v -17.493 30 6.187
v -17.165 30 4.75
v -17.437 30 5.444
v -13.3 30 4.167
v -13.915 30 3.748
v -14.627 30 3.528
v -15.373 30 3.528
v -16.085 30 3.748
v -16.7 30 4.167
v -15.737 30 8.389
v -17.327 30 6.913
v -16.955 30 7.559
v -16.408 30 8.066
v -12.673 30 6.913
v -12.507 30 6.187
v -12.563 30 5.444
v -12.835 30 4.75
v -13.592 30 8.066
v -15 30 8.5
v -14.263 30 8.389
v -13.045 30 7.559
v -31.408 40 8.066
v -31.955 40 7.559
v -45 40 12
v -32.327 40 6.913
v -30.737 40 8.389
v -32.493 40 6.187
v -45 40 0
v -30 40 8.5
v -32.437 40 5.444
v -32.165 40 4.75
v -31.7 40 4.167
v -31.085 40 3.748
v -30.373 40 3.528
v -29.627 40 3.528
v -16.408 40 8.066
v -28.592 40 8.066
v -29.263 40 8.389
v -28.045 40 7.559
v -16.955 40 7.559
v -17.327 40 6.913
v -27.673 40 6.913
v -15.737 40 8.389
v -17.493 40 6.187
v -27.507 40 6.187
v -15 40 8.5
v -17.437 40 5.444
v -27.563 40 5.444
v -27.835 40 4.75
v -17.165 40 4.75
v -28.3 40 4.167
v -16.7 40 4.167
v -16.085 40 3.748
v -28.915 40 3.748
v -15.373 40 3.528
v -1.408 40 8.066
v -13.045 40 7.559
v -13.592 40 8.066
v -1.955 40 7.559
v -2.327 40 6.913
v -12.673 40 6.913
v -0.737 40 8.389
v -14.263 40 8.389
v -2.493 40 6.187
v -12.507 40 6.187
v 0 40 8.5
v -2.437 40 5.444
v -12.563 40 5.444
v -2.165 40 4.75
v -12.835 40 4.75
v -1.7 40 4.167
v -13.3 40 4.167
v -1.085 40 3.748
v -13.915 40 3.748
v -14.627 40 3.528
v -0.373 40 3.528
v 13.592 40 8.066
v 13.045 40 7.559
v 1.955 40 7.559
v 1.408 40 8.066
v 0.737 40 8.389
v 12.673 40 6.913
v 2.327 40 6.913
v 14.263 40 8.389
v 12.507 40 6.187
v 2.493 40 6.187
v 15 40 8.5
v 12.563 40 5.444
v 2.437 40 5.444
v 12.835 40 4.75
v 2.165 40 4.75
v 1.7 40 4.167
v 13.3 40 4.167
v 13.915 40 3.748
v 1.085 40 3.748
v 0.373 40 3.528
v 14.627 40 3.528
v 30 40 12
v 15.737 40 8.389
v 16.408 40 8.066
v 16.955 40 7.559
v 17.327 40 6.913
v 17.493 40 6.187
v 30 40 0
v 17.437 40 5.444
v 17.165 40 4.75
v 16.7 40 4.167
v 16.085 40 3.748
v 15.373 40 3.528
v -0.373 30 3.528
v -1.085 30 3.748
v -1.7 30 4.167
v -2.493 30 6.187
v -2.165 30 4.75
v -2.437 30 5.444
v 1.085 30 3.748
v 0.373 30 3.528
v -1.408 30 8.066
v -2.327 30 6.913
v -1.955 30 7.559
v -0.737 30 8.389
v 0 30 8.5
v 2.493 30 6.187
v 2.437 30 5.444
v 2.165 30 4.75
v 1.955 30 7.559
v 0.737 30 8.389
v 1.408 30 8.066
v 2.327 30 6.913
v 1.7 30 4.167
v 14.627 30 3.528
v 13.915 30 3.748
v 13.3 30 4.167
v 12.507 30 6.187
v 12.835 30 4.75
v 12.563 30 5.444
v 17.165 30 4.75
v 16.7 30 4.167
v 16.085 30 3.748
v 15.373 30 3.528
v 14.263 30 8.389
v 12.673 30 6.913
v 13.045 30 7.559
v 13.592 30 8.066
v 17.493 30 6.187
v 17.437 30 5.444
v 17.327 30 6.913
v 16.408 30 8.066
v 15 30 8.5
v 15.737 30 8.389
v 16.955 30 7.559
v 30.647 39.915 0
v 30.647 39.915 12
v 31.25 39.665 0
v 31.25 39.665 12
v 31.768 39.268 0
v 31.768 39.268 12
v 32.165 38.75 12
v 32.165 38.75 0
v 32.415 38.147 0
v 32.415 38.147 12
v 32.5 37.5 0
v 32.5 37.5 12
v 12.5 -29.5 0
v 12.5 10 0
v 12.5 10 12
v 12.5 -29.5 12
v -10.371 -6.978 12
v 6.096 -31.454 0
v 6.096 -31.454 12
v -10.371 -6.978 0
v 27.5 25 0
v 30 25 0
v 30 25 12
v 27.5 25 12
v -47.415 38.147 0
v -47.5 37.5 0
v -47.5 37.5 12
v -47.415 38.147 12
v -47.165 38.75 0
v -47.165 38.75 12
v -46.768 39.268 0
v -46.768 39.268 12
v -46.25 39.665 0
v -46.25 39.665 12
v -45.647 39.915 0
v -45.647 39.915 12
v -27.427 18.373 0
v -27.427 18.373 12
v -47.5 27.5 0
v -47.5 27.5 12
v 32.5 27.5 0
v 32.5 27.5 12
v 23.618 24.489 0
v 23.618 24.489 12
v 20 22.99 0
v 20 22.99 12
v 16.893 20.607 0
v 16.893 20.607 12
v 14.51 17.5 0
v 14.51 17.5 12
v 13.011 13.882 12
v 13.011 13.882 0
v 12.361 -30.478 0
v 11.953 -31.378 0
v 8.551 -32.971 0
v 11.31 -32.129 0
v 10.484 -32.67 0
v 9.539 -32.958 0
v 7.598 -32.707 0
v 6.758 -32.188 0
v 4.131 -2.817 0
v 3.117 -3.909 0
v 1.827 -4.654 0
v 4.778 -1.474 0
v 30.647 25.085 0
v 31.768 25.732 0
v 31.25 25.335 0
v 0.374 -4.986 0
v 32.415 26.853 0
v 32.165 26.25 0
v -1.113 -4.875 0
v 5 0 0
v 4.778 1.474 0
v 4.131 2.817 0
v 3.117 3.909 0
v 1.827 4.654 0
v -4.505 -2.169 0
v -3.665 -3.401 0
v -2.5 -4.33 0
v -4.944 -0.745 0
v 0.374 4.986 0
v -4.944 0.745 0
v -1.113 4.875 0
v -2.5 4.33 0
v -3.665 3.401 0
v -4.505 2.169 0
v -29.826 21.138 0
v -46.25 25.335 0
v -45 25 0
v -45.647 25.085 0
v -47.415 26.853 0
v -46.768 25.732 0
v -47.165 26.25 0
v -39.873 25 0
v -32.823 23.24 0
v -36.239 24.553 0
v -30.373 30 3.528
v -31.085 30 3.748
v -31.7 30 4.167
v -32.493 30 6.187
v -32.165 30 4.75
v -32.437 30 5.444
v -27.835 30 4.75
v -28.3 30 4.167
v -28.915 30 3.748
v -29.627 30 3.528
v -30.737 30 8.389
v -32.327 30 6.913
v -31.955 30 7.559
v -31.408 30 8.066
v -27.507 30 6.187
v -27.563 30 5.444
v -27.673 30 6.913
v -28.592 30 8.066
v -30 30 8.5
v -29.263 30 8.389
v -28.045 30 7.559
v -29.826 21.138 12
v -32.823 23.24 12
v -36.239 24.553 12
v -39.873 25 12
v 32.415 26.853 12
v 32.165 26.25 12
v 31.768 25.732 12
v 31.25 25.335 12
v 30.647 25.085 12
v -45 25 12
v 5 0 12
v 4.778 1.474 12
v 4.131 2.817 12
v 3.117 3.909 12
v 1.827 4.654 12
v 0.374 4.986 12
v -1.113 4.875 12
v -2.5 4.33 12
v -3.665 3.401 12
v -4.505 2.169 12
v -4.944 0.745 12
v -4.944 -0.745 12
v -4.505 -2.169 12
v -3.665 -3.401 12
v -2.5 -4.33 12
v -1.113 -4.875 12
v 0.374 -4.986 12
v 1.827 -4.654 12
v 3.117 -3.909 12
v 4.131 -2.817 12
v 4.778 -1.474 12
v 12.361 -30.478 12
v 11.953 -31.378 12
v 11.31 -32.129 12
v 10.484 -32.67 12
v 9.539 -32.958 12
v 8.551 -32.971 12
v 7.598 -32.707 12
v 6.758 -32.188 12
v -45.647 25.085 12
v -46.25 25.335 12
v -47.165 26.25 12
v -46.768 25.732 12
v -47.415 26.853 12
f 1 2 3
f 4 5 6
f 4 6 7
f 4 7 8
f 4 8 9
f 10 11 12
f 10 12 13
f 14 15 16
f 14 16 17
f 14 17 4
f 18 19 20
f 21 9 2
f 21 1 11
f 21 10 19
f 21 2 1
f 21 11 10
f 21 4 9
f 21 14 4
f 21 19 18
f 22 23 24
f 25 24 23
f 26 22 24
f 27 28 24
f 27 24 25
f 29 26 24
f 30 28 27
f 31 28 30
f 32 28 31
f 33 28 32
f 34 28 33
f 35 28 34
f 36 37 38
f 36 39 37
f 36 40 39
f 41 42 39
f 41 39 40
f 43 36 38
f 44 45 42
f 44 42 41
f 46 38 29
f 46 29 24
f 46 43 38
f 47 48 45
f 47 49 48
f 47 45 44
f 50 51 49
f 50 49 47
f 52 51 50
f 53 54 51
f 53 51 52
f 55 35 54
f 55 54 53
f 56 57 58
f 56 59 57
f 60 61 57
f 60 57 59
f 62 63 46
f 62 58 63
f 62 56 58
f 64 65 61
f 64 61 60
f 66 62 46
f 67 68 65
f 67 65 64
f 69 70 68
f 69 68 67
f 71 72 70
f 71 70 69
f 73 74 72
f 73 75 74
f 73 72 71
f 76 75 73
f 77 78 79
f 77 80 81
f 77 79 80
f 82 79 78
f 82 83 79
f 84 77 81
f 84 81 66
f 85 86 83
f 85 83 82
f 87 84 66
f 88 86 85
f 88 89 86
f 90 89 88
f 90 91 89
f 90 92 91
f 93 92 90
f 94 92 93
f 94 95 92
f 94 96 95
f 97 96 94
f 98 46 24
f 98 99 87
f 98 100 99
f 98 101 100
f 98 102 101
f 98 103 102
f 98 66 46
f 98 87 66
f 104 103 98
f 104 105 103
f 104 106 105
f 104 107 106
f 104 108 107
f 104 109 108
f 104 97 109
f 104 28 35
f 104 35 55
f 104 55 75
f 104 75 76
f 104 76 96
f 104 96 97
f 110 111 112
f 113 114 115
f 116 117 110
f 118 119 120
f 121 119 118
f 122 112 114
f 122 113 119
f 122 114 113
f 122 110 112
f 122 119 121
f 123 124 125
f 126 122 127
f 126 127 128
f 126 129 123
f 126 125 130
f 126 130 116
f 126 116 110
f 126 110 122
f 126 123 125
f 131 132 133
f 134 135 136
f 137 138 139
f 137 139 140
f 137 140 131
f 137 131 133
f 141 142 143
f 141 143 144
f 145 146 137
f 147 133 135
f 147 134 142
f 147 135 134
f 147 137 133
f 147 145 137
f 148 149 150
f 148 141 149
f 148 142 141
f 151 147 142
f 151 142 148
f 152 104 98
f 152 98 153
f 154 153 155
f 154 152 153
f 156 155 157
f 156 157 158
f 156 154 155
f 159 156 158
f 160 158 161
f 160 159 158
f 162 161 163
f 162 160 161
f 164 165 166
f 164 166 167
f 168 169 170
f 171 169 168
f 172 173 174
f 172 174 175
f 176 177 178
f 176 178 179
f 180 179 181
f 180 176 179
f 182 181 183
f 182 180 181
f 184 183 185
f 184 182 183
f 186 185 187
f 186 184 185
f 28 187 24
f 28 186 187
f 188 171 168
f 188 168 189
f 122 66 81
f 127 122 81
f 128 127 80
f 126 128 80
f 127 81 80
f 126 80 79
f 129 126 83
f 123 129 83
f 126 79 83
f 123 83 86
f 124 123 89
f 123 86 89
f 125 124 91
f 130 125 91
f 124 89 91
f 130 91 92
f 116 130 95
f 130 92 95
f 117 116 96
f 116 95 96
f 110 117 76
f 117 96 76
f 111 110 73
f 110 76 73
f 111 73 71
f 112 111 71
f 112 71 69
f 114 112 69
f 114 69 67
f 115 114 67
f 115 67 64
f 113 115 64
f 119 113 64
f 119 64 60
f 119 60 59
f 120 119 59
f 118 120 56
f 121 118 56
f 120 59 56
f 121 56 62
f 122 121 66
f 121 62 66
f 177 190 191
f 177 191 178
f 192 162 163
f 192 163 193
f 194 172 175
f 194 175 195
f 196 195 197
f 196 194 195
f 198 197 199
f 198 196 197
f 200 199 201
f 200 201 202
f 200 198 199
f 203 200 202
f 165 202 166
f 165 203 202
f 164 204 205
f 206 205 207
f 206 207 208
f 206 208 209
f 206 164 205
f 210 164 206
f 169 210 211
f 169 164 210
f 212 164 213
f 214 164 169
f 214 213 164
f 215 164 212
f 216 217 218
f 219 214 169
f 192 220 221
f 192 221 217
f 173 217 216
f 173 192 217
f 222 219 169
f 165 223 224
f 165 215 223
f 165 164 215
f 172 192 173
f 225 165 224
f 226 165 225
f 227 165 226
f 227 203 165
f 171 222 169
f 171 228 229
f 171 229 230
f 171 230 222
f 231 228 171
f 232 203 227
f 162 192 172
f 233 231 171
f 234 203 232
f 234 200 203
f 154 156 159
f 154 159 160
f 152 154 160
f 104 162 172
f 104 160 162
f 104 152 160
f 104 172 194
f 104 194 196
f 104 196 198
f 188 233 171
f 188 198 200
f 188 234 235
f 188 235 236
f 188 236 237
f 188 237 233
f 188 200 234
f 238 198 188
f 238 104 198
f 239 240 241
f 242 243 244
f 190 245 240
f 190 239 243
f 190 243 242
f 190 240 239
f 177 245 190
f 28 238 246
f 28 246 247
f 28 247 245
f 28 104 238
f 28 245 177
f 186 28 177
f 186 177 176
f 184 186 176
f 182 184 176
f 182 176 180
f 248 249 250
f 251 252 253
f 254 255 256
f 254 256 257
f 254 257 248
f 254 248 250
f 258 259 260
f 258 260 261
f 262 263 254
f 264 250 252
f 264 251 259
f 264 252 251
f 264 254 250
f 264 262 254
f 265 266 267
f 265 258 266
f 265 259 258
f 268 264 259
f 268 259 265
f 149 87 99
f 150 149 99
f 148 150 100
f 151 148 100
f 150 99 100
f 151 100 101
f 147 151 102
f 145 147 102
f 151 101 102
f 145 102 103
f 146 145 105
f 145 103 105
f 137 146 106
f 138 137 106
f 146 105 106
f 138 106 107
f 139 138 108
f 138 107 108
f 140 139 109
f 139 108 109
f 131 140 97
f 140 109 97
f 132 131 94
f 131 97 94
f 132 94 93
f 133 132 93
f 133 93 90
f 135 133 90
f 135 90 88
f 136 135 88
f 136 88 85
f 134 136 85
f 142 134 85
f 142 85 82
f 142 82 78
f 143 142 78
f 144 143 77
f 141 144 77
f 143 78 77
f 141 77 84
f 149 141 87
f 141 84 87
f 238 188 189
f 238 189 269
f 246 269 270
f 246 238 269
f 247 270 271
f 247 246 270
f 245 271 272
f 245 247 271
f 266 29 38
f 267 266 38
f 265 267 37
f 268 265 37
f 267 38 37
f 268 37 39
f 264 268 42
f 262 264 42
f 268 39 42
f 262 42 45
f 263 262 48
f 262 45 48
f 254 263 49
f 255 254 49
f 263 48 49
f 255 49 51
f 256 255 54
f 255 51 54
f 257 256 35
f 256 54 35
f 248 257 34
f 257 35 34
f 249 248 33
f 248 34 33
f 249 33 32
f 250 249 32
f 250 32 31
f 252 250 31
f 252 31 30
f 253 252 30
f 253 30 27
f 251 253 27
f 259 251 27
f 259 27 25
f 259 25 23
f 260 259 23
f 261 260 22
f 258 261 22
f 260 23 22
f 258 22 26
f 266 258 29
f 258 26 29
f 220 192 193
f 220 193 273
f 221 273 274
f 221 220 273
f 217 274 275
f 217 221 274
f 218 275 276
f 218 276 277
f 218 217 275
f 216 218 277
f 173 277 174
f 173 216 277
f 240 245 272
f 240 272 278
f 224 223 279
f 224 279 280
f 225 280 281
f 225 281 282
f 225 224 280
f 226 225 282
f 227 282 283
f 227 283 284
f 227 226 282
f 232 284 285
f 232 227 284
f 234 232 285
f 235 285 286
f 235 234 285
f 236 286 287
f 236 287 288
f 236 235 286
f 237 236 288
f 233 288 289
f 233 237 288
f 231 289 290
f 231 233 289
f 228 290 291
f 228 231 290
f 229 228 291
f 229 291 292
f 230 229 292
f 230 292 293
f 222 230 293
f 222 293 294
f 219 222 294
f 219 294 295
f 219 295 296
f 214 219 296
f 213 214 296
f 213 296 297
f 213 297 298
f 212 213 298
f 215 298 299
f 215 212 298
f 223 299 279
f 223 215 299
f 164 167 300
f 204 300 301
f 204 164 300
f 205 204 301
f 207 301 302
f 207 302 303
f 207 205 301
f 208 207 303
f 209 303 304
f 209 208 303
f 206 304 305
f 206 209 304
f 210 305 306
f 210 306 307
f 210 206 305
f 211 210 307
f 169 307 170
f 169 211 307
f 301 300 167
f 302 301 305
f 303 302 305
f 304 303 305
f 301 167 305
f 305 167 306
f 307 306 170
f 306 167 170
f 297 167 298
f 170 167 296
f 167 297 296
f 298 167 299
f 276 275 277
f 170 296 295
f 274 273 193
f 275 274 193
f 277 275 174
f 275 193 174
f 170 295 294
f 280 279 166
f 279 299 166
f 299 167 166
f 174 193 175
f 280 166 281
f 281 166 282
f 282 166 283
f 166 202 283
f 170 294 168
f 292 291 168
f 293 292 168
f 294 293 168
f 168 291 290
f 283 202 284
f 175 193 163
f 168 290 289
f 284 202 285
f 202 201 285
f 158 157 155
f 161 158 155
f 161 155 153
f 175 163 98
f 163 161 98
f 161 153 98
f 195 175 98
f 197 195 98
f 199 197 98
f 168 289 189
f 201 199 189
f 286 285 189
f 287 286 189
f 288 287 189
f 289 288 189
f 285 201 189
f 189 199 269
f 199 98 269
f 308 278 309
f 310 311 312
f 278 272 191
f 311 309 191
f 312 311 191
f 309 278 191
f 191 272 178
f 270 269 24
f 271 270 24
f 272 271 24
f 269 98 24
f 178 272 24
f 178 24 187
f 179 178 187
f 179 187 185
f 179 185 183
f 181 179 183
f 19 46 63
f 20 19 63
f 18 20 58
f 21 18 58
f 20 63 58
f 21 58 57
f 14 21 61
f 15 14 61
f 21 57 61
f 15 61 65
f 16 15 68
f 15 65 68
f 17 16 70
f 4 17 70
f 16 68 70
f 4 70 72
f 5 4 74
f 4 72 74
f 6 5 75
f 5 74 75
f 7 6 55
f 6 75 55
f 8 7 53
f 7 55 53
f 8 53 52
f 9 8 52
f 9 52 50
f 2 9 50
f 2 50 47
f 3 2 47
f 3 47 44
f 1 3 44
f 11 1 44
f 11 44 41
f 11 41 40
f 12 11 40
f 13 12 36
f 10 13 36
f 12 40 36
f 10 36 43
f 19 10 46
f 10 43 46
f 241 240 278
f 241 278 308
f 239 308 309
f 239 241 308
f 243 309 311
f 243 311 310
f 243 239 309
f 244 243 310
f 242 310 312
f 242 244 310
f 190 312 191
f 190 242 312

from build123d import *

# Parameters (mm, degrees)
SKETCH_1_R          = 5
EXTRUDE_1_DEPTH     = 12
SKETCH_2_R          = 2.5
CUT_EXTRUDE_1_DEPTH = 10


with BuildPart() as part:
    # 草图1 → 凸台-拉伸1 (new body)
    with BuildSketch(Plane.XY):
        with BuildLine():
            Line((12.5, 0), (12.5, -29.5))
            ThreePointArc((12.5, -29.5), (10.021323251, -32.847670655), (6.096057819, -31.453745072))
            Line((6.096057819, -31.453745072), (-10.371222076, -6.977660972))
            Line((-10.371222076, -6.977660972), (-27.427039052, 18.373193167))
            ThreePointArc((-27.427039052, 18.373193167), (-32.822608292, 23.240050935), (-39.872505543, 25))
            Line((-39.872505543, 25), (-45, 25))
            ThreePointArc((-45, 25), (-46.767766953, 25.732233047), (-47.5, 27.5))
            Line((-47.5, 27.5), (-47.5, 37.5))
            ThreePointArc((-47.5, 37.5), (-46.767766953, 39.267766953), (-45, 40))
            Line((-45, 40), (30, 40))
            ThreePointArc((30, 40), (31.767766953, 39.267766953), (32.5, 37.5))
            Line((32.5, 37.5), (32.5, 27.5))
            ThreePointArc((32.5, 27.5), (31.767766953, 25.732233047), (30, 25))
            Line((30, 25), (27.5, 25))
            ThreePointArc((27.5, 25), (16.893398282, 20.606601718), (12.5, 10))
            Line((12.5, 10), (12.5, 0))
        make_face()
        Circle(SKETCH_1_R, mode=Mode.SUBTRACT)
    extrude(amount=EXTRUDE_1_DEPTH)

    # 草图2 → 切除-拉伸1 (cut)
    with BuildSketch(Plane(origin=(0, 40, 0), x_dir=(1, 0, 0), z_dir=(0, 1, 0))):
        with Locations(Location((-30, -6, 0), (0, 0, 270))):
            Circle(SKETCH_2_R)
        with Locations(Location((-15, -6, 0), (0, 0, 270))):
            Circle(SKETCH_2_R)
        with Locations(Location((0, -6, 0), (0, 0, 270))):
            Circle(SKETCH_2_R)
        with Locations(Location((15, -6, 0), (0, 0, 270))):
            Circle(SKETCH_2_R)
    extrude(amount=-CUT_EXTRUDE_1_DEPTH, mode=Mode.SUBTRACT)


solid = part.part
